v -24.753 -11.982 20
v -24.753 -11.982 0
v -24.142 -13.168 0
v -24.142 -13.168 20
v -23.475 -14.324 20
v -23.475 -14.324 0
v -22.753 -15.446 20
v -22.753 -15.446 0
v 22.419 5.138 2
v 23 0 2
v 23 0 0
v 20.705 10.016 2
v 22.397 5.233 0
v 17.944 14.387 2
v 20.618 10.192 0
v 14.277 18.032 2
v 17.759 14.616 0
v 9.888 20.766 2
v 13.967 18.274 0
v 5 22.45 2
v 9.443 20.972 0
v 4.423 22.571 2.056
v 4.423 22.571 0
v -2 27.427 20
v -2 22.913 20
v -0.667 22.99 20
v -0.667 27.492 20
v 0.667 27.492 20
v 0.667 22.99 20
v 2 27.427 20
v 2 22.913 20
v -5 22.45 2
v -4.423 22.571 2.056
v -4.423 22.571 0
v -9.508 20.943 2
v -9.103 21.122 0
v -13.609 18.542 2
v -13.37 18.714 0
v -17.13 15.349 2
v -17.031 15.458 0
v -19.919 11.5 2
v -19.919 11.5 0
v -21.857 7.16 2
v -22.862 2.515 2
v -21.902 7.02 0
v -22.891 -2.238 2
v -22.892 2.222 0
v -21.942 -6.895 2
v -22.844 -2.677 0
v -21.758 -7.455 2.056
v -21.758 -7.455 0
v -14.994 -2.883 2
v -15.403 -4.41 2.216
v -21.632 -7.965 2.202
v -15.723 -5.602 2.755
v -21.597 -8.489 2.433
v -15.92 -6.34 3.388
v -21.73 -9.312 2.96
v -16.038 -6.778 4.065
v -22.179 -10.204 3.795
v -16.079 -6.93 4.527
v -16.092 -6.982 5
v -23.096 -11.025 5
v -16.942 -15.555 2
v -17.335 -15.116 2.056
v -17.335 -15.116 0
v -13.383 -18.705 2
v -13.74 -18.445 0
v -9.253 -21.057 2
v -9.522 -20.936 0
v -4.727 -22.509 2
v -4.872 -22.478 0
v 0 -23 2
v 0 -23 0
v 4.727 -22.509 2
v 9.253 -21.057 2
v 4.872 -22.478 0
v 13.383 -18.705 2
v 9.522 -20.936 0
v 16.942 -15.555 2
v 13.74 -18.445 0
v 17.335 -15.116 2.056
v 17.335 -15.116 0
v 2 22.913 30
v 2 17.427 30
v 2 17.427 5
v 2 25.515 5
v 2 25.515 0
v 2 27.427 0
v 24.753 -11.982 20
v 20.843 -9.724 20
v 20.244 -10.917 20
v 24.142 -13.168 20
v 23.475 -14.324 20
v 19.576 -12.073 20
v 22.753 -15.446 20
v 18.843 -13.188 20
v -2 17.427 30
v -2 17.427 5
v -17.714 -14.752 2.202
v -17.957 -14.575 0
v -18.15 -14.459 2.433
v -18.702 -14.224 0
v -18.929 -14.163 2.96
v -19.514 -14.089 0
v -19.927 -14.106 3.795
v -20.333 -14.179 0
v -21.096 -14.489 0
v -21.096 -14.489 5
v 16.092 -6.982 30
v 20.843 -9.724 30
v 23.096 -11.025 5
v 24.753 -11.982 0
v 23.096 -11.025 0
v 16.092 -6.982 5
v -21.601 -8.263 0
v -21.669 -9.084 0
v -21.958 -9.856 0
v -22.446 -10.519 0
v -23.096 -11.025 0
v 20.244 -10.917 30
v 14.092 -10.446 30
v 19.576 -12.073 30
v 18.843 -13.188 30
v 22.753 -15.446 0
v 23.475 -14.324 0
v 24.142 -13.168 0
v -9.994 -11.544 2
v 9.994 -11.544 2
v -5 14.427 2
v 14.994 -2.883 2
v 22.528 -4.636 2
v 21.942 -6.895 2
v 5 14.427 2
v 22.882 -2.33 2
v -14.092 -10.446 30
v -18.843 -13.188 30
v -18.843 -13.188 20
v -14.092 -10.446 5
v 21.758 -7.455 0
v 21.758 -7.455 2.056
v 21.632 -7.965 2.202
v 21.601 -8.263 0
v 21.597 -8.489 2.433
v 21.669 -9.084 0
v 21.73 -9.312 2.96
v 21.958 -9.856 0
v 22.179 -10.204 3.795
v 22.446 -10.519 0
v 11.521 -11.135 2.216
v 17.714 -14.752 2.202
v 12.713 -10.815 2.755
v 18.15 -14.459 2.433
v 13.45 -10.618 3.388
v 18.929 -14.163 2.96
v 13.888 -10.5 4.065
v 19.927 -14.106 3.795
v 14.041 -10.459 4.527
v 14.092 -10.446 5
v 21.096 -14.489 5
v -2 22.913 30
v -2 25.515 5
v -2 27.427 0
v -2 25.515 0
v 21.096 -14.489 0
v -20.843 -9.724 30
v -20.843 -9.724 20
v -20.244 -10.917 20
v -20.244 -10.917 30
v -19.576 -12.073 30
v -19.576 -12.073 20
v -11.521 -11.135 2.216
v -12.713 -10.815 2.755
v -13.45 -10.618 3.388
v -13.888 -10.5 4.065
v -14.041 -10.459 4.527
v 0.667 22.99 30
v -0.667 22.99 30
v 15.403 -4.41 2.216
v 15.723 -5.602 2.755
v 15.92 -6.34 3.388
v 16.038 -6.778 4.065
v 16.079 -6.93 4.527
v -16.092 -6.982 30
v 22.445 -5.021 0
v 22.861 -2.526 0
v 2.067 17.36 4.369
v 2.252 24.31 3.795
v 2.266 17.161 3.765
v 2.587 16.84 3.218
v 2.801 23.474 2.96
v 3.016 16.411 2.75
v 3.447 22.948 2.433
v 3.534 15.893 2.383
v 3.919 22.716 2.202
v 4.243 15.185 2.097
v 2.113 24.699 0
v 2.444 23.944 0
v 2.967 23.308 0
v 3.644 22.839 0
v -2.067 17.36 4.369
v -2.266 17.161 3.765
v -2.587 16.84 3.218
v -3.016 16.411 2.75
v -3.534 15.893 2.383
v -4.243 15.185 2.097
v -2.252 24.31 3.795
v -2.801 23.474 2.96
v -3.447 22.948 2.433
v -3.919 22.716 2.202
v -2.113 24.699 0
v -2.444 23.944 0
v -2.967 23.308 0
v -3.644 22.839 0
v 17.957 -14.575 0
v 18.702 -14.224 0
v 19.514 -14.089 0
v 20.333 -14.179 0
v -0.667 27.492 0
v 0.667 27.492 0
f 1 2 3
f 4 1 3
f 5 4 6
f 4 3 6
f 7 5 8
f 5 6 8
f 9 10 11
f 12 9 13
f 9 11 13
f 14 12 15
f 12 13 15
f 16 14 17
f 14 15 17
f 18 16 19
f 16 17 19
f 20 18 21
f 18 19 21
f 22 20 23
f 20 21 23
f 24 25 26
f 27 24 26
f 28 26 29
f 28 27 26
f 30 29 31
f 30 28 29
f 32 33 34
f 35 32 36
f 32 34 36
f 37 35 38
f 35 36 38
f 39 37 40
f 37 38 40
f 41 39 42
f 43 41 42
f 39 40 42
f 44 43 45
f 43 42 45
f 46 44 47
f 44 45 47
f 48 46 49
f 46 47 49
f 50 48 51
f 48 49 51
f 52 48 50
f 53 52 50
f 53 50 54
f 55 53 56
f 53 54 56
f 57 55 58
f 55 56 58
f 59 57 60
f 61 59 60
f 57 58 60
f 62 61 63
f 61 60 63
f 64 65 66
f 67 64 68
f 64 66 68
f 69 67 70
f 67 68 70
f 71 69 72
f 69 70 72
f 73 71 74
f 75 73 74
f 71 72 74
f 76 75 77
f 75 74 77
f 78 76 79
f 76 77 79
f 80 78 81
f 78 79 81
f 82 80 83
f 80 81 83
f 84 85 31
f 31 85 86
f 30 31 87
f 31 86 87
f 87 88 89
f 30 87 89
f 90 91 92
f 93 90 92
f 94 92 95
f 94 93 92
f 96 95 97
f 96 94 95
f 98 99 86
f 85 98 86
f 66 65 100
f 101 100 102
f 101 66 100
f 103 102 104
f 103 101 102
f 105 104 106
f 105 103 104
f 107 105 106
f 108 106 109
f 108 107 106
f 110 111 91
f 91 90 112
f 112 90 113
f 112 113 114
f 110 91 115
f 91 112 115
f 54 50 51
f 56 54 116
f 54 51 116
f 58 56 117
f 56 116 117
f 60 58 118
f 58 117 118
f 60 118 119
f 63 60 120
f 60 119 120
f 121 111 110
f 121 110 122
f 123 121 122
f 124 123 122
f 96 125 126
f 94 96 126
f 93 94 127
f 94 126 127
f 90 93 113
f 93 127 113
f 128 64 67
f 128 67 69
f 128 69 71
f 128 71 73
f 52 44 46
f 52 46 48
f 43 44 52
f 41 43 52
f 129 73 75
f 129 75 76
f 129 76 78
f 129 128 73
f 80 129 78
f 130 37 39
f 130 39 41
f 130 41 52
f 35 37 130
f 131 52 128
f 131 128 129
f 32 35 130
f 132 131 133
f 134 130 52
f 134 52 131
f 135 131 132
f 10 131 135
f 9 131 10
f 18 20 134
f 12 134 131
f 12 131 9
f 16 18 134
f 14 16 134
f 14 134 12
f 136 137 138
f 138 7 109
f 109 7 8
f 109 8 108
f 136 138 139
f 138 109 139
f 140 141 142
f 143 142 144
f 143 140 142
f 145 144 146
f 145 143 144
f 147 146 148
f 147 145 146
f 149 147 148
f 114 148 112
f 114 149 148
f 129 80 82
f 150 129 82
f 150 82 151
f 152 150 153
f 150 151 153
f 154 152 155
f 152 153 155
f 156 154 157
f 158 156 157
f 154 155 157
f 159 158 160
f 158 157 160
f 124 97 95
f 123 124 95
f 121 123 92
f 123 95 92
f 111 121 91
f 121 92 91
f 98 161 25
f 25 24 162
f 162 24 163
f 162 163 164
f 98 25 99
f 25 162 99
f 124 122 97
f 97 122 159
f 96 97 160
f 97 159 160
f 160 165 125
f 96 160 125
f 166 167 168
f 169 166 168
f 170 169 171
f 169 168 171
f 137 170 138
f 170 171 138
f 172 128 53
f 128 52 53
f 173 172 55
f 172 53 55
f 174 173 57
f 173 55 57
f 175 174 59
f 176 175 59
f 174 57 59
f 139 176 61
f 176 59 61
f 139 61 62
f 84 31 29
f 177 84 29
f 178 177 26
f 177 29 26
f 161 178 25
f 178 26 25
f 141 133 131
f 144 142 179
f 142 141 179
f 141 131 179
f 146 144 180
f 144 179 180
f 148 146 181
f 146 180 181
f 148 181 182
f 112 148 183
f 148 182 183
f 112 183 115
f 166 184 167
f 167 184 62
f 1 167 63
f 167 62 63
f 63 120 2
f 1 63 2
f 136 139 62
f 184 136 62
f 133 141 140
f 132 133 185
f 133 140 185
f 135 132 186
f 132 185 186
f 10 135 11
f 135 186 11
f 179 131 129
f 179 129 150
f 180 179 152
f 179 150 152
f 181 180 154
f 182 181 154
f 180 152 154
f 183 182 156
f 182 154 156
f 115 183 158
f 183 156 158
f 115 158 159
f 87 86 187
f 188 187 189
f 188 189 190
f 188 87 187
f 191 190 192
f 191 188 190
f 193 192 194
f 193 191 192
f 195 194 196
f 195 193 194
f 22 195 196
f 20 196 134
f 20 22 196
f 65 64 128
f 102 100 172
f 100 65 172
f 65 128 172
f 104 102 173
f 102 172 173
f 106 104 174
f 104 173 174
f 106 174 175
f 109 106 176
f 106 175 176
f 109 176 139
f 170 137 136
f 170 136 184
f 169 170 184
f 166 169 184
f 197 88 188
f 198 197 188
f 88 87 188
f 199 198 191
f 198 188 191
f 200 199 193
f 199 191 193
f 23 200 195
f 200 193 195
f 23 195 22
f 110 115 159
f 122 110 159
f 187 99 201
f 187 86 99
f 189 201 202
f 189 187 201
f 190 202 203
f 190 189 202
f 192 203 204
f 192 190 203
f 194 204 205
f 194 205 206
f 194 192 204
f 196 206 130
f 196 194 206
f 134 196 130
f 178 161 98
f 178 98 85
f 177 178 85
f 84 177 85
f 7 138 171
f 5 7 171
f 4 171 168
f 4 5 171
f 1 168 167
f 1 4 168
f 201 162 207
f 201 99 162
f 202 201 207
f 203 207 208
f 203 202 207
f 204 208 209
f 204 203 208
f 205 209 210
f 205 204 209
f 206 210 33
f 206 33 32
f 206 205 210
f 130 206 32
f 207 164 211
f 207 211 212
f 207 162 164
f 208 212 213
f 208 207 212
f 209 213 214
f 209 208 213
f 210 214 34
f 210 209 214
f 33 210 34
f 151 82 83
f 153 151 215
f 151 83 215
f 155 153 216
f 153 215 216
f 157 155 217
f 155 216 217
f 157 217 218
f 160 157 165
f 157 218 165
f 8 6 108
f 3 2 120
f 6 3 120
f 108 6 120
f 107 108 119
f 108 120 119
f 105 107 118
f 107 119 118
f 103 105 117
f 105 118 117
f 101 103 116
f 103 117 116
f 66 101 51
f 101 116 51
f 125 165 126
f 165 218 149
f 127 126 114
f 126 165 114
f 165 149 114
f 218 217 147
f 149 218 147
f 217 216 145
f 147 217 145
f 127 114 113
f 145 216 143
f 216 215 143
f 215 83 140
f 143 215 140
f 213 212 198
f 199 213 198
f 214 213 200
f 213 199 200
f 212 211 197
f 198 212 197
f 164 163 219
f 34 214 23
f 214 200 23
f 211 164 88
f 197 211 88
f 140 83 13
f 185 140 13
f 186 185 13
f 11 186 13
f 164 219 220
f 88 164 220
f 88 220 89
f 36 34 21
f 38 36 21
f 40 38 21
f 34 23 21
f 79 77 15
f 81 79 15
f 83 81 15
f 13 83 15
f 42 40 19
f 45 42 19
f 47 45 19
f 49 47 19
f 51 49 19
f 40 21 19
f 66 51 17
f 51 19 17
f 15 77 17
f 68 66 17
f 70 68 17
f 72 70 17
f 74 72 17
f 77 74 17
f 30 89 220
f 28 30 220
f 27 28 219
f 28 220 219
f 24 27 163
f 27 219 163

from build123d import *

# Parameters (mm, degrees)
F5_DEPTH = 30
F6_DEPTH = 20
F0_COUNT = 3
F1_DEPTH = 2
F2_R     = 3


# Not quite as in the source:
# - a feature names something its author has since deleted; it is built from what else it names


with BuildPart() as f5:
    # F4 (on Top) → F5 (new body)
    with BuildSketch(Plane.XY):
        with BuildLine():
            ThreePointArc((2, 22.9128784748), (0, 23), (-2, 22.9128784748))
            Line((-2, 22.9128784748), (-2, 17.4271763038))
            Line((-2, 17.4271763038), (2, 17.4271763038))
            Line((2, 17.4271763038), (2, 22.9128784748))
        make_face()
    extrude(amount=F5_DEPTH)

    # F4 (on Top) → F6 (join)
    with BuildSketch(Plane.XY):
        with BuildLine():
            Line((2, 24.4271763038), (2, 27.4271763038))
            Line((2, 27.4271763038), (-2, 27.4271763038))
            Line((-2, 27.4271763038), (-2, 22.9128784748))
            ThreePointArc((-2, 22.9128784748), (0, 23), (2, 22.9128784748))
            Line((2, 22.9128784748), (2, 24.4271763038))
        make_face()
        with BuildLine():
            Line((-2, 27.4271763038), (2, 27.4271763038))
            ThreePointArc((2, 27.4271763038), (0, 27.5), (-2, 27.4271763038))
        make_face()
    extrude(amount=F6_DEPTH)


with BuildPart() as f0_1:
    # F0: instance of F5
    add(f5.part.rotate(Axis((0, 0, 0), (0, 0, 1)), 1 * 360 / F0_COUNT))


with BuildPart() as f0_2:
    # F0: instance of F5
    add(f5.part.rotate(Axis((0, 0, 0), (0, 0, 1)), 2 * 360 / F0_COUNT))


with BuildPart() as f5_1:
    add(f5.part)

    add(f0_1.part)  # F1 merges F0_1

    add(f0_2.part)  # F1 merges F0_2
    # F4 (on Top) → F1 (join)
    with BuildSketch(Plane.XY):
        with BuildLine():
            ThreePointArc((2, 22.9128784748), (0, 23), (-2, 22.9128784748))
            Line((-2, 22.9128784748), (-2, 17.4271763038))
            Line((-2, 17.4271763038), (2, 17.4271763038))
            Line((2, 17.4271763038), (2, 22.9128784748))
        make_face()
        with BuildLine():
            Line((-2, 17.4271763038), (-2, 22.9128784748))
            ThreePointArc((-2, 22.9128784748), (-15.5402702679, -16.9558249578), (23, 0))
            ThreePointArc((23, 0), (16.9558249578, 15.5402702679), (2, 22.9128784748))
            Line((2, 22.9128784748), (2, 17.4271763038))
            Line((2, 17.4271763038), (-2, 17.4271763038))
        make_face()
    extrude(amount=F1_DEPTH)

    # F2
    f2_edges = [f5_1.edges().sort_by_distance(p)[0] for p in [
        (-2, 20.170027, 2),
        (0, 17.427176, 2),
        (2, 20.170027, 2),
        (16.467756, -11.817065, 2),
        (15.092377, -8.713588, 2),
        (18.467756, -8.352963, 2),
        (-18.467756, -8.352963, 2),
        (-15.092377, -8.713588, 2),
        (-16.467756, -11.817065, 2),
        (-2, 22.912878, 1),
        (-20.843135, -9.724388, 1),
        (2, 22.912878, 1),
        (20.843135, -9.724388, 1),
        (18.843135, -13.18849, 1),
        (-18.843135, -13.18849, 1),
    ]]
    fillet(f2_edges, radius=F2_R)


solid = f5_1.part
